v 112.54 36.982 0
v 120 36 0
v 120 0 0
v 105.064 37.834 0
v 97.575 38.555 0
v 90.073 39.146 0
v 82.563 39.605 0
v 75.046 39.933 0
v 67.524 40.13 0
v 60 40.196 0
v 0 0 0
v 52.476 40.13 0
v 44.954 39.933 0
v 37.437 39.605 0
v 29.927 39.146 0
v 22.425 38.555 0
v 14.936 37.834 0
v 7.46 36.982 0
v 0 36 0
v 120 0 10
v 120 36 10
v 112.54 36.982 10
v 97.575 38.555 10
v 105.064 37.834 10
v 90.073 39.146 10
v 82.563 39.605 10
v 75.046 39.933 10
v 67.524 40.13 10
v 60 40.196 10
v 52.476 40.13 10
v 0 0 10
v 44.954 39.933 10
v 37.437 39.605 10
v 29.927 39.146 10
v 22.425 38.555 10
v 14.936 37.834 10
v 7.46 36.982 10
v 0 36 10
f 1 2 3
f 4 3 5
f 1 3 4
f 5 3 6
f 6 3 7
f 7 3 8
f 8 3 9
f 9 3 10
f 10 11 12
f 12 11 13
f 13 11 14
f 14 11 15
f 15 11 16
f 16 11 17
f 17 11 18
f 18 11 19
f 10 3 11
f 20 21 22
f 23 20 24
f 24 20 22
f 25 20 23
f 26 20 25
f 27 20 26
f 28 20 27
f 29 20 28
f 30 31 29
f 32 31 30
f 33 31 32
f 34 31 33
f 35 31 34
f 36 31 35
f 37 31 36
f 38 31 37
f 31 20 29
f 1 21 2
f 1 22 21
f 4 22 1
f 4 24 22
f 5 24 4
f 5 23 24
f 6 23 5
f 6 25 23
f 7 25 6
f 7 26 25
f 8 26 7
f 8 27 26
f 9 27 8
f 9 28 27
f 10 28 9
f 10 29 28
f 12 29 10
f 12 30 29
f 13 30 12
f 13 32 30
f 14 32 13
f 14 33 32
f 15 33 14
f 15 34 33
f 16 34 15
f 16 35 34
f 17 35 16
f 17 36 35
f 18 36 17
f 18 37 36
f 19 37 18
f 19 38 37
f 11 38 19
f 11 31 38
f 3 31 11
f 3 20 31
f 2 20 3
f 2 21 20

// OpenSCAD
$fn = 32;

// ----------------------------------------------------------------------
// Arc profile plate: crown, 19 points
// ----------------------------------------------------------------------

// --- parameters (mm) ---
bar_l = 120;              // bar length, X
bar_w = 36;               // bar height at the ends, Y
arc_r = 431.12;           // radius of the crown arc
arc_angle = 16;           // crown arc angle, degrees
crown_rise = 4.2;         // rise of the crown over the ends
arc_step = 1;             // sampling step of the crown arc, degrees
plate_t = 10;             // plate thickness, Z

bbox_y = bar_w + crown_rise;  // full height with the crown

profile = [[120, 36], [112.54, 36.982], [105.064, 37.834], [97.575, 38.555], [90.073, 39.146], [82.563, 39.605], [75.046, 39.933], [67.524, 40.13], [60, 40.196], [52.476, 40.13], [44.954, 39.933], [37.437, 39.605], [29.927, 39.146], [22.425, 38.555], [14.936, 37.834], [7.46, 36.982], [0, 36], [0, 0], [120, 0]];  // primary outline, 19 points, counter clockwise

// --- the one profile operation ---
linear_extrude(height = plate_t) polygon(points = profile);
